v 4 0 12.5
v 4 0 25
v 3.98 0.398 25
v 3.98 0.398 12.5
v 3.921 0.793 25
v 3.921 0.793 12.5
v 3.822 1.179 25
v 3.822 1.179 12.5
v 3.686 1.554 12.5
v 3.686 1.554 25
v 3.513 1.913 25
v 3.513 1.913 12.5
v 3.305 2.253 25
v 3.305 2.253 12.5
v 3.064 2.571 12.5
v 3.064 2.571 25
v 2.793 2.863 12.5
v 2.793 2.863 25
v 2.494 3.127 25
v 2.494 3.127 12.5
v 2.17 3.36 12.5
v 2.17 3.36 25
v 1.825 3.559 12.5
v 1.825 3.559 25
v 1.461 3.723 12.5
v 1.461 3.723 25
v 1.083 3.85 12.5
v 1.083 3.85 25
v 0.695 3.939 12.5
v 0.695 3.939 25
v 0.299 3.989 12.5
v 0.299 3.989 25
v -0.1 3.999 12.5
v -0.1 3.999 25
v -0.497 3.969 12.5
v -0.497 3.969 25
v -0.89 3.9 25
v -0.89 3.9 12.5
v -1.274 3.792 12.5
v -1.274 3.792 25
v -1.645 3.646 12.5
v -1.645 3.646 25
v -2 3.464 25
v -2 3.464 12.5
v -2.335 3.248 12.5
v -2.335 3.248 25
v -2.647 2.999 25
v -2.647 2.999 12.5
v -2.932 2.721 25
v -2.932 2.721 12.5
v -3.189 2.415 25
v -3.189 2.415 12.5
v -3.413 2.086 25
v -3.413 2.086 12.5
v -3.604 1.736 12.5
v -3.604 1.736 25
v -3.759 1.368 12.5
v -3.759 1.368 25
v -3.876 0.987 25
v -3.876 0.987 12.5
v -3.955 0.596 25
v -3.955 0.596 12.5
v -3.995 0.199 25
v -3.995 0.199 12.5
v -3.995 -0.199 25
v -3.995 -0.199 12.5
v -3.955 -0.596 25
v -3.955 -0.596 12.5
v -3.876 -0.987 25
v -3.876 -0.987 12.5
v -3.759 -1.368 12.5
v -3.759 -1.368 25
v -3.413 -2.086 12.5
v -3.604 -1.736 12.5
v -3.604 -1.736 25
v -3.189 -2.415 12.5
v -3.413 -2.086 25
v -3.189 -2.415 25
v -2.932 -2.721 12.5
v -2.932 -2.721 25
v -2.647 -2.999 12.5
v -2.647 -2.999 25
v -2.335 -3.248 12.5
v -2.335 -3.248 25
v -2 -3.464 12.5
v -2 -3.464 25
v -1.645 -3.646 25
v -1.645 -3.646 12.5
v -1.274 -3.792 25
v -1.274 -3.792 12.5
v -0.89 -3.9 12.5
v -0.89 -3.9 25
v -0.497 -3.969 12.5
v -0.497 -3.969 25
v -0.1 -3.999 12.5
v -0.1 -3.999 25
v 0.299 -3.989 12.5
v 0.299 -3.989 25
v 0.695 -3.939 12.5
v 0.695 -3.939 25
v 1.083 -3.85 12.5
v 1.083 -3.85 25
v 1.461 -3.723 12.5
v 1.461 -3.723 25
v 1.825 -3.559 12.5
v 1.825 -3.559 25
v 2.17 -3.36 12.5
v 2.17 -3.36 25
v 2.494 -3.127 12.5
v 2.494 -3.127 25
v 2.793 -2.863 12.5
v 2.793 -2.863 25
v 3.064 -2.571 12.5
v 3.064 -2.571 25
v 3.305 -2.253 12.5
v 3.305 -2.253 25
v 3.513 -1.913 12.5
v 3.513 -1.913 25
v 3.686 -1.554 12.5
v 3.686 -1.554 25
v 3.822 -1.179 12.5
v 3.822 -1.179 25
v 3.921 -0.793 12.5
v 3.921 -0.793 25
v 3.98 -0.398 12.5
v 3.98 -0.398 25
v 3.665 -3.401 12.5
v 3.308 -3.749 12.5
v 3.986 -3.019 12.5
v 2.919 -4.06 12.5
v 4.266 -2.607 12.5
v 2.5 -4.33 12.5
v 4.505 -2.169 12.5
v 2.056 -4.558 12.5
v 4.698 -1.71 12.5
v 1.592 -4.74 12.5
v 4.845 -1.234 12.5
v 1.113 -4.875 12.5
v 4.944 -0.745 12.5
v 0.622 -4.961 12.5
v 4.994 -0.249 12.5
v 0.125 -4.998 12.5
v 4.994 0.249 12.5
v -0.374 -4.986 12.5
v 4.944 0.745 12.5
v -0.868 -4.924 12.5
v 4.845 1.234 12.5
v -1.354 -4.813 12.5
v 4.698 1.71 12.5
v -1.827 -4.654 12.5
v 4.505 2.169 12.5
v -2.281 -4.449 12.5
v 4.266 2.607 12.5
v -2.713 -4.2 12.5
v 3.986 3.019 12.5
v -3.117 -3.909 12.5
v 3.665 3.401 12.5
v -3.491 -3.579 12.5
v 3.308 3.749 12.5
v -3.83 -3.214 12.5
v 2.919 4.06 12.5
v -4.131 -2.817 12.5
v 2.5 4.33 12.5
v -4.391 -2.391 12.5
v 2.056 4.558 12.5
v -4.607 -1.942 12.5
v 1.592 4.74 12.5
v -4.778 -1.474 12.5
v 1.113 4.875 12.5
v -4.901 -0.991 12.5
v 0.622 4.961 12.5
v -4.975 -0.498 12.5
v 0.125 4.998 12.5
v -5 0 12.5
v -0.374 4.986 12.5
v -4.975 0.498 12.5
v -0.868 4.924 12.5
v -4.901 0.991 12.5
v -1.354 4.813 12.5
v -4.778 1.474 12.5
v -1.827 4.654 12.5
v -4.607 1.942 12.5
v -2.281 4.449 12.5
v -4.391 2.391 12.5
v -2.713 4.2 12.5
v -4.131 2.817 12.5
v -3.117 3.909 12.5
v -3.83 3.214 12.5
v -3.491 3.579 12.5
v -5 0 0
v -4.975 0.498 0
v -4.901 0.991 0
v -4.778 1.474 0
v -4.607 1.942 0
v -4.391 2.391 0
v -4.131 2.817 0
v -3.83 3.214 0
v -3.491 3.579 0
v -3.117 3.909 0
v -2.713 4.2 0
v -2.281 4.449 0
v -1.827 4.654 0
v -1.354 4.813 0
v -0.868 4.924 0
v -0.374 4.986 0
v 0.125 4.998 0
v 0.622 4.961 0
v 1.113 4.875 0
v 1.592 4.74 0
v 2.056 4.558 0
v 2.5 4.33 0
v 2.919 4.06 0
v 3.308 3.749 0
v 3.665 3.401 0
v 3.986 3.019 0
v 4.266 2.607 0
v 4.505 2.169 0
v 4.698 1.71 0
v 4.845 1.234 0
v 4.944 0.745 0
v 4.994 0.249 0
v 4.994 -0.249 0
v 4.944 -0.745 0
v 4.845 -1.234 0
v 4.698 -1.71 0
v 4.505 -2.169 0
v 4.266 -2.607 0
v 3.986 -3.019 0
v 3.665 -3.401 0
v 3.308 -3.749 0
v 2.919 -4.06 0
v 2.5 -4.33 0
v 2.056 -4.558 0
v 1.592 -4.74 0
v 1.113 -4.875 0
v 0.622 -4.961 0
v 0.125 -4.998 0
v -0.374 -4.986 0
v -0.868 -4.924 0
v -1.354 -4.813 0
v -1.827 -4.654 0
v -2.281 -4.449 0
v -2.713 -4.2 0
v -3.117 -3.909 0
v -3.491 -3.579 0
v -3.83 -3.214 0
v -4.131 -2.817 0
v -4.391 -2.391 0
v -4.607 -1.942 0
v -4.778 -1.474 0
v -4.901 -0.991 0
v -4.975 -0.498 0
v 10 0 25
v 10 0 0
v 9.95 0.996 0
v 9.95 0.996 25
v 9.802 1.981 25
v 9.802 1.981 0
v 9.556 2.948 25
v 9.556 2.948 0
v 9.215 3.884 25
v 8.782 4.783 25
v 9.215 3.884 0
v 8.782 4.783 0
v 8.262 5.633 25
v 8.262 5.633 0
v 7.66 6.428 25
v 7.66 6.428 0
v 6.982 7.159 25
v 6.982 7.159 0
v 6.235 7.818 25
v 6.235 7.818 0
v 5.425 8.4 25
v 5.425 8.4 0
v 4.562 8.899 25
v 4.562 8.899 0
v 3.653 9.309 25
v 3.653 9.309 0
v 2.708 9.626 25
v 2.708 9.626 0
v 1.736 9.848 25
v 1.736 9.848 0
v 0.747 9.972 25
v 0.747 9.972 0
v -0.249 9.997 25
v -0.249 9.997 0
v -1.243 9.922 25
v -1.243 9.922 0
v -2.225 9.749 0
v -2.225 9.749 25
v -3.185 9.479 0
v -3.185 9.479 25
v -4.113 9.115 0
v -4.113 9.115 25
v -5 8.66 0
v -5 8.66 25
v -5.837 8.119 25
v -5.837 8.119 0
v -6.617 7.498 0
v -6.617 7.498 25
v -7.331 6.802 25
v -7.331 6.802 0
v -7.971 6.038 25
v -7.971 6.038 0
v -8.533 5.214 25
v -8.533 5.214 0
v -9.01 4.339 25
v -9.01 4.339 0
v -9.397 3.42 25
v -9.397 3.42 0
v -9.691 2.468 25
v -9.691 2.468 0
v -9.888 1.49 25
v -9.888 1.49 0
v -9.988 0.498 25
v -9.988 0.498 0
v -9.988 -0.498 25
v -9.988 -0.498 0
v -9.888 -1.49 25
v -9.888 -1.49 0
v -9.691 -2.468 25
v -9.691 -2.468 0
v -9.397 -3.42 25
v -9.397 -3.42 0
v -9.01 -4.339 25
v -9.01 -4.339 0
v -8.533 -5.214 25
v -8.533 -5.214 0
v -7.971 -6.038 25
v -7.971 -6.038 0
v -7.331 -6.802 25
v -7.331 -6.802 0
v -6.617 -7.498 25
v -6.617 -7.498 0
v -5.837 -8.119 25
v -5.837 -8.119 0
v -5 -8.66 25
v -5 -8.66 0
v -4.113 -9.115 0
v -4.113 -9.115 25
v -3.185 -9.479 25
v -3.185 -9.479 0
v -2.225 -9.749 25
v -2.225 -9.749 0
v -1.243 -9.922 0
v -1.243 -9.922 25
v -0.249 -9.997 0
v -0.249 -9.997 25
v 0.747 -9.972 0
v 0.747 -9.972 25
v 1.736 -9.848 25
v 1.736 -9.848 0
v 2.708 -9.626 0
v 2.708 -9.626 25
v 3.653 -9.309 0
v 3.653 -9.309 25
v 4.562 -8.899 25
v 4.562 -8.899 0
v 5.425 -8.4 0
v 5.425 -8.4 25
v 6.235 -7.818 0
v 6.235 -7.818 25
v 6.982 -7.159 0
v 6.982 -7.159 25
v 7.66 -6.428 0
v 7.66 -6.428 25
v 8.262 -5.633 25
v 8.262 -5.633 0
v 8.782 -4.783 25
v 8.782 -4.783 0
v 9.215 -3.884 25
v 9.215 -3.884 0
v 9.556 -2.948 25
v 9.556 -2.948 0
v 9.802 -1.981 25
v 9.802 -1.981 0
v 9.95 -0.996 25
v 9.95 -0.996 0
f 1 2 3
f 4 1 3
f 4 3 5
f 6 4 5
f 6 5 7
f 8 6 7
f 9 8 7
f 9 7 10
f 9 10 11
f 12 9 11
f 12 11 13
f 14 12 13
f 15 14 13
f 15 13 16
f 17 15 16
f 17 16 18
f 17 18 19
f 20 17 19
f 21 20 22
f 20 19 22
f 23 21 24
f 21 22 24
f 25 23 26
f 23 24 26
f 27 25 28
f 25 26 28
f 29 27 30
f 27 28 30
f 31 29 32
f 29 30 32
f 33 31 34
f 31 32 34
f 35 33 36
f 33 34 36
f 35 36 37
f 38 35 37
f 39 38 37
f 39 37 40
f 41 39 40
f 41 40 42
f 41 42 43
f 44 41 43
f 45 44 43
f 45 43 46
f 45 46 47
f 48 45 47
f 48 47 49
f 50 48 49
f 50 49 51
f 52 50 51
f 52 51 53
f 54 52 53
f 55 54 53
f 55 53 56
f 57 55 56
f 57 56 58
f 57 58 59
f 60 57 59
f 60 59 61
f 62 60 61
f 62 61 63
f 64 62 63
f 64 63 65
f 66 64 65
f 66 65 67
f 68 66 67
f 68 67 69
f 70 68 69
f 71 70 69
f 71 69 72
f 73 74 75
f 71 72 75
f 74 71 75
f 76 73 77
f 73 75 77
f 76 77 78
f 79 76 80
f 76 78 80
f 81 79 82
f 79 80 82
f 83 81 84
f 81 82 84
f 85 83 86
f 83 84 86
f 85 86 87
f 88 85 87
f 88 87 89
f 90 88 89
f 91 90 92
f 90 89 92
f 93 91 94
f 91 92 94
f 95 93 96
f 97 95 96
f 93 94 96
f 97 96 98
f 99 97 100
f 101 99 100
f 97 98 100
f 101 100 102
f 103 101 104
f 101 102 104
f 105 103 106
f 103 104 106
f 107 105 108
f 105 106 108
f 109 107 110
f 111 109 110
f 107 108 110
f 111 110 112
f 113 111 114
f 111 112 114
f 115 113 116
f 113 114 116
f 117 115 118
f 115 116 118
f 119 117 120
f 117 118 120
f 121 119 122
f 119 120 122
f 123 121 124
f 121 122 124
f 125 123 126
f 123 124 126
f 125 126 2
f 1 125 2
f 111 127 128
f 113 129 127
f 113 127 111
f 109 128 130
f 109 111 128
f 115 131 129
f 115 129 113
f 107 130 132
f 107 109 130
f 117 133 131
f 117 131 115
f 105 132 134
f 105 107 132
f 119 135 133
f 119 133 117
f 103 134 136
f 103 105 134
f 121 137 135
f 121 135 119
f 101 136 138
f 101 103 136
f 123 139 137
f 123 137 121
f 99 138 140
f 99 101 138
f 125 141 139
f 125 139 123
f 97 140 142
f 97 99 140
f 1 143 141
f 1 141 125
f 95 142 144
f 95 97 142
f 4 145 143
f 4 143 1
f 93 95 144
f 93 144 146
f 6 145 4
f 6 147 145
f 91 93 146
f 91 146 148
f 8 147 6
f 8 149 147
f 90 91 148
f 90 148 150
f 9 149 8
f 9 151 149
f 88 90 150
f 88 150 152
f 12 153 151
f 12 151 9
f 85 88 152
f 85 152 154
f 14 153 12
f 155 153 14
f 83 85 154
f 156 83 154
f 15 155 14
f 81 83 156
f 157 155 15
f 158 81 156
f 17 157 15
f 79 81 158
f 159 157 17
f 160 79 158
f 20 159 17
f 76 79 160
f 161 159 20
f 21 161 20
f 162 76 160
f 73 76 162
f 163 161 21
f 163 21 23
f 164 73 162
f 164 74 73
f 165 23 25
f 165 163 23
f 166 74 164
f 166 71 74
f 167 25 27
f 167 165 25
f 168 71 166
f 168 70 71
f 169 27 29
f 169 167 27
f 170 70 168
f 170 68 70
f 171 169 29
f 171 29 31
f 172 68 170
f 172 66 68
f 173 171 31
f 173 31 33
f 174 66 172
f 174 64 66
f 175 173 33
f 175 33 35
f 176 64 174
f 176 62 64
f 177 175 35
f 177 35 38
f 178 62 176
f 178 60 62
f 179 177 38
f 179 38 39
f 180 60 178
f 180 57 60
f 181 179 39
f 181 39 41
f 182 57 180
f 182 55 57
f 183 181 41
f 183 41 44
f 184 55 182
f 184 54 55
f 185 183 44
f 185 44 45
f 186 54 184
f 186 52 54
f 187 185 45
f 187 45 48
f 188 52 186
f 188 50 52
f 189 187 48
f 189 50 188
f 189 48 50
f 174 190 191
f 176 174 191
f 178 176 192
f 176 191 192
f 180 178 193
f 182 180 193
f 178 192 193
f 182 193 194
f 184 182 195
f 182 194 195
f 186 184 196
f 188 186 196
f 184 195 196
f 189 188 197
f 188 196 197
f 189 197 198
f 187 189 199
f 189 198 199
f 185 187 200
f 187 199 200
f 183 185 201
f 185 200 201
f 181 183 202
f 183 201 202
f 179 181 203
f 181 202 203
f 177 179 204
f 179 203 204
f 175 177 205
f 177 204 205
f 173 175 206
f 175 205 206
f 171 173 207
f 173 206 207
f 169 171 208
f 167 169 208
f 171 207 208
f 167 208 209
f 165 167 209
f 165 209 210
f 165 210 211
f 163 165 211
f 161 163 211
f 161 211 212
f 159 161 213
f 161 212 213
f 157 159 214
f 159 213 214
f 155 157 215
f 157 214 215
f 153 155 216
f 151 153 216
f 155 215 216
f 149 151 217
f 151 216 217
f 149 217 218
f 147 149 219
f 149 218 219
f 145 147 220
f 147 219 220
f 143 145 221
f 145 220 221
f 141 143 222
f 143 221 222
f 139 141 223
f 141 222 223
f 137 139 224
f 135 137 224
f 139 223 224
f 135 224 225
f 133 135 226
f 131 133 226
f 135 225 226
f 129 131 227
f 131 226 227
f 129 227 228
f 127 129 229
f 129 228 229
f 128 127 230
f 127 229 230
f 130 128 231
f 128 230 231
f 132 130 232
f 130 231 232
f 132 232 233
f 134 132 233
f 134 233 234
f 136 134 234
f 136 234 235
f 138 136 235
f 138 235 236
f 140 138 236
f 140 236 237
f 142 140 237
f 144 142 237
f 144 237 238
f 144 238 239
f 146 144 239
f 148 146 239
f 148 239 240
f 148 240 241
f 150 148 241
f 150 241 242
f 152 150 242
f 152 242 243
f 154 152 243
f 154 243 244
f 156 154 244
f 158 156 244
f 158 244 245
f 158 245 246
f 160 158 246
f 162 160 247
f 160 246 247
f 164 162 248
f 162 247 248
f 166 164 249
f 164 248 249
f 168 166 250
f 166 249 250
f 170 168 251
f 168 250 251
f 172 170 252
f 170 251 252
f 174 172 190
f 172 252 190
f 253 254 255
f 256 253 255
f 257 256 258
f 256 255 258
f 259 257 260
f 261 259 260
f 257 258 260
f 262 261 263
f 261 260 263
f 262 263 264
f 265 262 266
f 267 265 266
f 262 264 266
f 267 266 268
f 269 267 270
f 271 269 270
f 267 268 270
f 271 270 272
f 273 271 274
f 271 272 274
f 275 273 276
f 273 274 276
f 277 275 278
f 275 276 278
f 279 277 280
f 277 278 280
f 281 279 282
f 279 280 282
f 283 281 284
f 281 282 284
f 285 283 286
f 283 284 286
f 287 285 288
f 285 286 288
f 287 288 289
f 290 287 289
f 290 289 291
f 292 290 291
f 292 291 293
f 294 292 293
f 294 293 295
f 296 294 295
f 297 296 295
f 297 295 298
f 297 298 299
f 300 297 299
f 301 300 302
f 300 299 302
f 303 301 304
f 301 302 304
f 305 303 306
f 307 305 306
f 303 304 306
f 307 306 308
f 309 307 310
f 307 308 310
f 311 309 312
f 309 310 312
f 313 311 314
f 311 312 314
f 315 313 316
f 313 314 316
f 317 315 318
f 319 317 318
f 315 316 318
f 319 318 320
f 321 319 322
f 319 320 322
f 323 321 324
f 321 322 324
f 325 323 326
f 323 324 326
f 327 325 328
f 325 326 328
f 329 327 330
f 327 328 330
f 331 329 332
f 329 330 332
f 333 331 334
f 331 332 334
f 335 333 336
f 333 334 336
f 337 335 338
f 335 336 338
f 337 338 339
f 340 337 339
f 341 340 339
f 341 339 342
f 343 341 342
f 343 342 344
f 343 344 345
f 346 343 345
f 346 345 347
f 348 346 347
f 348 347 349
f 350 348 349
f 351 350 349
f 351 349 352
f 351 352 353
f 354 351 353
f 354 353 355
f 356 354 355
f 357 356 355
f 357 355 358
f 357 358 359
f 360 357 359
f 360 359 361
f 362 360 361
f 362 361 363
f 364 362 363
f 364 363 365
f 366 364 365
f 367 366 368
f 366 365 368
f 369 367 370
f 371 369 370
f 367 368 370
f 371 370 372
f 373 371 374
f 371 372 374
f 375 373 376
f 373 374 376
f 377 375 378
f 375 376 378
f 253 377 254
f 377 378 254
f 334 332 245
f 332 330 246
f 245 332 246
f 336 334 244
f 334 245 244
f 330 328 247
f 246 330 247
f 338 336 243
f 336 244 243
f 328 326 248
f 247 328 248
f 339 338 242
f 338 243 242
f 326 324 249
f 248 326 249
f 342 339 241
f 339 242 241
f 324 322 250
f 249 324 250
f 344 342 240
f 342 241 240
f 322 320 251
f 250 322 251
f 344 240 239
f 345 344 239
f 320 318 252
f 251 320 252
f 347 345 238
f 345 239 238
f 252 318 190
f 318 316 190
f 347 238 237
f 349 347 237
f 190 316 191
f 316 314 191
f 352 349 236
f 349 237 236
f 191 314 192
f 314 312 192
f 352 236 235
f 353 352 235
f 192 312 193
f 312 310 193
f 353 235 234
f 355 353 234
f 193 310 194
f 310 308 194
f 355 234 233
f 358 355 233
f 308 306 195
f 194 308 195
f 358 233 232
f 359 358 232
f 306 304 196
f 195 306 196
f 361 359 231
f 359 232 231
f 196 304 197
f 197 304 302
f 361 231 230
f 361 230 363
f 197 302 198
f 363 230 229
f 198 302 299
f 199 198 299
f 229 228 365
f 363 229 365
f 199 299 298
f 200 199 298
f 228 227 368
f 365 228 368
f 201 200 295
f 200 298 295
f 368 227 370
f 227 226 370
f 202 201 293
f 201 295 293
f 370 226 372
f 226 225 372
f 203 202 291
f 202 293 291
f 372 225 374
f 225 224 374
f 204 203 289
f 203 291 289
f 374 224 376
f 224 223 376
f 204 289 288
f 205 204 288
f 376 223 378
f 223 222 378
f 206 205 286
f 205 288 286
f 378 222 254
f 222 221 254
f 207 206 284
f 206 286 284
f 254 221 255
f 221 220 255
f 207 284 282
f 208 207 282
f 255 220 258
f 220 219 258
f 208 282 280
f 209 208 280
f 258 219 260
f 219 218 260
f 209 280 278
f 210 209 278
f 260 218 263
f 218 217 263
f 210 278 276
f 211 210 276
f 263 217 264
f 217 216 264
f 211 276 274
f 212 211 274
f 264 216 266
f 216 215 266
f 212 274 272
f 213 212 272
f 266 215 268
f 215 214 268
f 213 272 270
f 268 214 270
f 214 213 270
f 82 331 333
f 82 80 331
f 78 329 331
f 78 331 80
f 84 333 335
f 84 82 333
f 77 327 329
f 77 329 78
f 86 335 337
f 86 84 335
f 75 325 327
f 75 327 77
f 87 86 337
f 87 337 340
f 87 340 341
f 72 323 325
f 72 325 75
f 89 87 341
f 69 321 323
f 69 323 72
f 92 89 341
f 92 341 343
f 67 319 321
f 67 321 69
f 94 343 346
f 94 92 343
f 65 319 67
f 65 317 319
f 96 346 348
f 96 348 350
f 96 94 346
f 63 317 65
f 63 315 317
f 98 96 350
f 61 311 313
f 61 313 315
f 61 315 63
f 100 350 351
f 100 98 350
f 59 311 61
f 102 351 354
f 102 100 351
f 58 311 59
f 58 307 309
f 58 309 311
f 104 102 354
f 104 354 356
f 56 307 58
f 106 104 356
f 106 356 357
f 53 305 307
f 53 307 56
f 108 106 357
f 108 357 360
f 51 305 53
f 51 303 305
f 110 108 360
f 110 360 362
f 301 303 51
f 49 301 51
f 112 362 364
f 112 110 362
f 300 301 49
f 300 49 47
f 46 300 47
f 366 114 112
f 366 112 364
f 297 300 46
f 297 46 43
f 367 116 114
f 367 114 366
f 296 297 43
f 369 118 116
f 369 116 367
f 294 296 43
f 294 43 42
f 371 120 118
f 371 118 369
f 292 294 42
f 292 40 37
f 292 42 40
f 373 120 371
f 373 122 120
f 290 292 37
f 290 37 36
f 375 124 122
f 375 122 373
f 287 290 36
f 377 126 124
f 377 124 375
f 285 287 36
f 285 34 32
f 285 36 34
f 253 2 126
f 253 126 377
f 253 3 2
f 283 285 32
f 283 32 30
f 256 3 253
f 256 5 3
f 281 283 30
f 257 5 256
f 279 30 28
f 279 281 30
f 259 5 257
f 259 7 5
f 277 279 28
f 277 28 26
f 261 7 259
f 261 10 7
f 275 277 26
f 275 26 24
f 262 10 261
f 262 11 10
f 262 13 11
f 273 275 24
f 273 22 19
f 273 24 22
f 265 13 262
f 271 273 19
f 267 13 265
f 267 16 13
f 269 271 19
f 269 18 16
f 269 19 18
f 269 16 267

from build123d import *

# Parameters (mm, degrees)
SKETCH_1_R          = 10
EXTRUDE_1_DEPTH     = 25
SKETCH_3_R          = 4
CUT_EXTRUDE_1_DEPTH = 7.5
SKETCH_4_R          = 5
CUT_EXTRUDE_2_DEPTH = 12.5
SKETCH_5_R          = 4
CUT_EXTRUDE_3_DEPTH = 23.5


with BuildPart() as part:
    # 草图1 → 凸台-拉伸1 (new body)
    with BuildSketch(Plane.XY):
        Circle(SKETCH_1_R)
    extrude(amount=EXTRUDE_1_DEPTH)

    # 草图3 → 切除-拉伸1 (cut)
    with BuildSketch(Plane.XY.offset(25)):
        Circle(SKETCH_3_R)
    extrude(amount=-CUT_EXTRUDE_1_DEPTH, mode=Mode.SUBTRACT)

    # 草图4 → 切除-拉伸2 (cut)
    with BuildSketch(Plane(origin=(0, 0, 0), x_dir=(-1, 0, 0), z_dir=(0, 0, -1))):
        Circle(SKETCH_4_R)
    extrude(amount=-CUT_EXTRUDE_2_DEPTH, mode=Mode.SUBTRACT)

    # 草图5 → 切除-拉伸3 (cut, through all)
    with BuildSketch(Plane.XY.offset(17.5)):
        Circle(SKETCH_5_R)
    extrude(amount=-CUT_EXTRUDE_3_DEPTH, mode=Mode.SUBTRACT)


solid = part.part
